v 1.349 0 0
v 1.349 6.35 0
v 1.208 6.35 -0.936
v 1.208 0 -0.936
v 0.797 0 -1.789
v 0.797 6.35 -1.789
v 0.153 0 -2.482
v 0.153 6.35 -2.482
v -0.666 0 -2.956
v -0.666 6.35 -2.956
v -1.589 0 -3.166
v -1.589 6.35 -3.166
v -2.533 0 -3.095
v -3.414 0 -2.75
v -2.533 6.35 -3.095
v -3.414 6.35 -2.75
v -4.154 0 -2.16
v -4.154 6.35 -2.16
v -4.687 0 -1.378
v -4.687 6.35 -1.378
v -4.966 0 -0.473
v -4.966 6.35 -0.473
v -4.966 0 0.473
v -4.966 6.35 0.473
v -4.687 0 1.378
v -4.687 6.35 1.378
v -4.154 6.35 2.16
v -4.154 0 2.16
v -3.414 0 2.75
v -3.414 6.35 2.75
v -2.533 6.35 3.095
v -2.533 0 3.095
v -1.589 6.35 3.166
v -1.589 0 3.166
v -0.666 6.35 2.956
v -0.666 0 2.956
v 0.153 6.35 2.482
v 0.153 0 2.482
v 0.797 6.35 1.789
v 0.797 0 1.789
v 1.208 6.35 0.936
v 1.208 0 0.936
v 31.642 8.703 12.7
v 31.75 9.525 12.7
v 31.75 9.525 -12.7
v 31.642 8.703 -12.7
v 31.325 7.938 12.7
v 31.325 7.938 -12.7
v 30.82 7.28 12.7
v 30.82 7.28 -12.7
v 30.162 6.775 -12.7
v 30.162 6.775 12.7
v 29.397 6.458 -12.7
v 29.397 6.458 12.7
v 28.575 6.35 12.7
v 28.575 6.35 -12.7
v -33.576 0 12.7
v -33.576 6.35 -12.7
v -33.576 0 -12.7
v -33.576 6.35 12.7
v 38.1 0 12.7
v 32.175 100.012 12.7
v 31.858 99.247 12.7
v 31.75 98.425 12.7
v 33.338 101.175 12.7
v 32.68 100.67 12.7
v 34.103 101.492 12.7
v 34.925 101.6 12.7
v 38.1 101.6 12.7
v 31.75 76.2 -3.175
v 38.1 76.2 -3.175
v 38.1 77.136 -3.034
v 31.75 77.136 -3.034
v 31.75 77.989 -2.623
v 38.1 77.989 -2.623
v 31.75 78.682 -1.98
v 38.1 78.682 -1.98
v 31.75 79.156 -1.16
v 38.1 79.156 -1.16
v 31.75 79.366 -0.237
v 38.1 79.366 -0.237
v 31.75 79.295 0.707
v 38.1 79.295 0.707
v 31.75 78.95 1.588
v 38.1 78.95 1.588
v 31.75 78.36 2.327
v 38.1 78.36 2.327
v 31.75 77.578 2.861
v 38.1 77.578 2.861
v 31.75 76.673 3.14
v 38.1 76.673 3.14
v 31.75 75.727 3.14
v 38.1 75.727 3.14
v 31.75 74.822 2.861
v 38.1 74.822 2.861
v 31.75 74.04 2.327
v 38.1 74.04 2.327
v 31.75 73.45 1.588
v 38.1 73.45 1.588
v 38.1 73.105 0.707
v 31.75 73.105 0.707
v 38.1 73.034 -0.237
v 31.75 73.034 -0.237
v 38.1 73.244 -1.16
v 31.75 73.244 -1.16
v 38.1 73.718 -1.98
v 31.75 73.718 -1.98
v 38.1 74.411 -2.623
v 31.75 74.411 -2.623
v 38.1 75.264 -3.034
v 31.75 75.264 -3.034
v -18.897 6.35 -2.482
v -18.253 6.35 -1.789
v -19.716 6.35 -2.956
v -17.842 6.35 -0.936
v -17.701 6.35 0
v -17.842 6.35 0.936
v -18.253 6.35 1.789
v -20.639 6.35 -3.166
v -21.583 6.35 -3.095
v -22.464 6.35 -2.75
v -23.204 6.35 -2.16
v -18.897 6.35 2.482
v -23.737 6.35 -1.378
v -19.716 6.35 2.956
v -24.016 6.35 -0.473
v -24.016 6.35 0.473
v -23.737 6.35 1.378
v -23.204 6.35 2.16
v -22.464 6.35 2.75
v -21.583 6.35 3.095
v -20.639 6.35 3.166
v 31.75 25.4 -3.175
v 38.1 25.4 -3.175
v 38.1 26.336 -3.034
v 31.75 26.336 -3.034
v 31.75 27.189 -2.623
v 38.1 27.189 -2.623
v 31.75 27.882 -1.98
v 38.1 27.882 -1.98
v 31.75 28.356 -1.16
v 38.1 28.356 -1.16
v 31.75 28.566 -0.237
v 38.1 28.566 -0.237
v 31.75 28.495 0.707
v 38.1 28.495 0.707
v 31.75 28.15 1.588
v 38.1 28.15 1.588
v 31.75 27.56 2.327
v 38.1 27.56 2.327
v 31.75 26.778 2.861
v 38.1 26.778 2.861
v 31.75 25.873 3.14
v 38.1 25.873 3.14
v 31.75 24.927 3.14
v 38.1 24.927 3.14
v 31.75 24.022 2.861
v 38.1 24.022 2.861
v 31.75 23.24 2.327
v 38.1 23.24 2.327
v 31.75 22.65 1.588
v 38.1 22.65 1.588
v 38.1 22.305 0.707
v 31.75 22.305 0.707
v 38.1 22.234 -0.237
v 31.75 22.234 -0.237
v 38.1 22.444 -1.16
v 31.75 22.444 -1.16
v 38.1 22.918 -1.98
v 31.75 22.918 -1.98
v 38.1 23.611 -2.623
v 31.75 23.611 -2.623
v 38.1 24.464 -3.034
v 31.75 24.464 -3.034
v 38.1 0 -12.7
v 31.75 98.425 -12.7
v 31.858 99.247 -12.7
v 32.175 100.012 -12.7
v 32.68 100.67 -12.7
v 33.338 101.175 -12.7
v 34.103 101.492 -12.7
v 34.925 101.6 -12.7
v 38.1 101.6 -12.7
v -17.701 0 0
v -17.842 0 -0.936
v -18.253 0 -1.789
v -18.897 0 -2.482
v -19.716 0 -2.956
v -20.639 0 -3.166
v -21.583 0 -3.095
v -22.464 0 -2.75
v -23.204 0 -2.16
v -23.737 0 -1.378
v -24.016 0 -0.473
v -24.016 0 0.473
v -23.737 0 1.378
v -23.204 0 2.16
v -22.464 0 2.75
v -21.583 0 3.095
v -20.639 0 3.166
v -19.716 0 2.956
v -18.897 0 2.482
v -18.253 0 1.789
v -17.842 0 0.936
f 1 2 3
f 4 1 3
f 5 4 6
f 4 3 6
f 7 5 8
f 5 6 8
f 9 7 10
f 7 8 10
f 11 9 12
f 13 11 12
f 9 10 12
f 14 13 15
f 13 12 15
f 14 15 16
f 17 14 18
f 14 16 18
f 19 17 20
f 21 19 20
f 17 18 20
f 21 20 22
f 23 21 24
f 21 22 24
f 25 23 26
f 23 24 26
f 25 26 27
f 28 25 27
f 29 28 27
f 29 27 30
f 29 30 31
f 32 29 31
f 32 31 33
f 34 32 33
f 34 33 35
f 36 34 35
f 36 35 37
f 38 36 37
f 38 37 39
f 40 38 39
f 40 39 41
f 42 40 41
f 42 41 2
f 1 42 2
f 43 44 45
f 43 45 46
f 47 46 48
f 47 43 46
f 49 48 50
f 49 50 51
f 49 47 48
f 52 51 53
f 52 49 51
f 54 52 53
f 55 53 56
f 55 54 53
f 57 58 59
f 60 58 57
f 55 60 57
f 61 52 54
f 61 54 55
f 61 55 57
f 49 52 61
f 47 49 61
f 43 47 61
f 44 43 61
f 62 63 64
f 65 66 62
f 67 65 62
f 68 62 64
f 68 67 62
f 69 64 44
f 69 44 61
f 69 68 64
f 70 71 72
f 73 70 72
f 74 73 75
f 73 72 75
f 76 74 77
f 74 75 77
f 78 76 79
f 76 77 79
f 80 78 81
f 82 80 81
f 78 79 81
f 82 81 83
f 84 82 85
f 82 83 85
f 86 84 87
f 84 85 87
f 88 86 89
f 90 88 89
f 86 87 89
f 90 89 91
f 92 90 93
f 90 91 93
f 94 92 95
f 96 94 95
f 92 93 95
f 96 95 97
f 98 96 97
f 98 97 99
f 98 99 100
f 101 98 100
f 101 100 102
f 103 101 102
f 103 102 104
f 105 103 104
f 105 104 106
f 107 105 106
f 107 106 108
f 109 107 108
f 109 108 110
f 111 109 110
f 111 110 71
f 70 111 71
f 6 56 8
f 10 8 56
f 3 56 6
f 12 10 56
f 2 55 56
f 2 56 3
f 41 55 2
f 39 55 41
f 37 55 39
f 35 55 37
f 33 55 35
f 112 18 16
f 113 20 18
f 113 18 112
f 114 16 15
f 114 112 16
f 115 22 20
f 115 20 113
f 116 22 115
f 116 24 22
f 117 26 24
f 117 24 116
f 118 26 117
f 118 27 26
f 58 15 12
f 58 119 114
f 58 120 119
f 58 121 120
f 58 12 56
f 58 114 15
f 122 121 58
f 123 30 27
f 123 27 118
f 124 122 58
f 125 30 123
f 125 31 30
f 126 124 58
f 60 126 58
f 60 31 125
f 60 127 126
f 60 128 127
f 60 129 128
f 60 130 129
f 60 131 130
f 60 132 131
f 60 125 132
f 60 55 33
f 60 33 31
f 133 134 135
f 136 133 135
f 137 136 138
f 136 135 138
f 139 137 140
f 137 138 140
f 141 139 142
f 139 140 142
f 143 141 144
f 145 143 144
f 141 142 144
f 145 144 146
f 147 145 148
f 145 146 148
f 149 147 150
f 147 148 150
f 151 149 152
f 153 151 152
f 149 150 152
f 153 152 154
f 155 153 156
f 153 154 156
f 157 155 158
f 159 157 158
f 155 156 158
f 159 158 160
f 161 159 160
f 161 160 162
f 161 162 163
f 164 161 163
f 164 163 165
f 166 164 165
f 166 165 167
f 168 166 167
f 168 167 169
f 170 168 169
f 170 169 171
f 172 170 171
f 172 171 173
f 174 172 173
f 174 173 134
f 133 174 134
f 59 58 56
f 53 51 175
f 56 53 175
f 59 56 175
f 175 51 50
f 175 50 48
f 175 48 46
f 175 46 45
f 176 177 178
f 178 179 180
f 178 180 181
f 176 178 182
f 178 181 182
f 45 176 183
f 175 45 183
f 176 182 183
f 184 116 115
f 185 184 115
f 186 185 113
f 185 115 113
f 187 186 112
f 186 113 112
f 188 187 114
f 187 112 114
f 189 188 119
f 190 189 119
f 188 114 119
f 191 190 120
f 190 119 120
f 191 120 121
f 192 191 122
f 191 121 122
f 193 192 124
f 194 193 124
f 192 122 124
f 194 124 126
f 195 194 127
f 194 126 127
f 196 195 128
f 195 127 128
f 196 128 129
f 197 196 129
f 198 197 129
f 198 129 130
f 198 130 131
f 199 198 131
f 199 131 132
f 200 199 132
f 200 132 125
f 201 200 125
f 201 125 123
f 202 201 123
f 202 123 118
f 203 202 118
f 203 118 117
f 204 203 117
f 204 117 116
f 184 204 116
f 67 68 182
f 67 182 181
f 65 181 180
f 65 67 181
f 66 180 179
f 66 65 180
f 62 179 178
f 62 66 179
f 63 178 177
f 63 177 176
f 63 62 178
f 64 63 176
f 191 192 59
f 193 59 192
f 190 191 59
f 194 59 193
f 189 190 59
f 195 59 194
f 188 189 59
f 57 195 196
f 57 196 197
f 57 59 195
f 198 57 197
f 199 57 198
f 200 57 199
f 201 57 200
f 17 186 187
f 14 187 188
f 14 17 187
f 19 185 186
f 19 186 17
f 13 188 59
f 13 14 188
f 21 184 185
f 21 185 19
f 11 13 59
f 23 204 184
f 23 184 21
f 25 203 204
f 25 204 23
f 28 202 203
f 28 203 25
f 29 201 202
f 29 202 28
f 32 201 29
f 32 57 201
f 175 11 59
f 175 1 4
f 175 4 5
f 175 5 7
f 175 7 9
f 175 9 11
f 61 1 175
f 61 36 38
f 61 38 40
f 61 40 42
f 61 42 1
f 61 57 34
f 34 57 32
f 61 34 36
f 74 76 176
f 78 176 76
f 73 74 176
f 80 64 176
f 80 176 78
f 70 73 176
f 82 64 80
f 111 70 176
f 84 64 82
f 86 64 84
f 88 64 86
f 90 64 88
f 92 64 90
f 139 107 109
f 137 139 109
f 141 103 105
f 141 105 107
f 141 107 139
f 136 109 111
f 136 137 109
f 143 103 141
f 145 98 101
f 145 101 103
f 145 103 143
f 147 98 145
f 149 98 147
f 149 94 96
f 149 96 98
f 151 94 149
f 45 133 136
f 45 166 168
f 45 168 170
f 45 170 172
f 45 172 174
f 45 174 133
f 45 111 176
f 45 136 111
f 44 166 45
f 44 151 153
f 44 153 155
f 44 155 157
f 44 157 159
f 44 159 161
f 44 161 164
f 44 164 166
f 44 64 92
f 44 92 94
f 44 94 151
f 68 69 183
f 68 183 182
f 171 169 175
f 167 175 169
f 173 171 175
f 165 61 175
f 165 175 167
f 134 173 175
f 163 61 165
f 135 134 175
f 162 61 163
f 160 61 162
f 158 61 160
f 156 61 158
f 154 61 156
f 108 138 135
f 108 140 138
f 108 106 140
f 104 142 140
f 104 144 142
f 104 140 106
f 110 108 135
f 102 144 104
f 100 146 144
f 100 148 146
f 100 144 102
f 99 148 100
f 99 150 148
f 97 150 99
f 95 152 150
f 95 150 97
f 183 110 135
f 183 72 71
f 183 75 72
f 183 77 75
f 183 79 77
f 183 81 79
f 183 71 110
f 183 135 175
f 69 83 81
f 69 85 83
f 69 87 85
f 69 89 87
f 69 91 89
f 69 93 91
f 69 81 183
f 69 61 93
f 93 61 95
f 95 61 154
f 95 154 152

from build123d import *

# Parameters (mm, degrees)
BOSS_EXTRUDE1_DEPTH = 12.7
CUT_EXTRUDE1_REACH  = 78.2
SKETCH3_R           = 3.175
SKETCH4_W           = 28.507373457
SKETCH4_H           = 9.150354521
CUT_EXTRUDE2_DEPTH  = 4.52374
SKETCH5_R           = 3.175
CUT_EXTRUDE3_DEPTH  = 7.35


with BuildPart() as part:
    # Sketch2 → Boss-Extrude1 (new body, symmetric)
    with BuildSketch(Plane.XY):
        with BuildLine():
            Line((-38.1, 0), (38.1, 0))
            Line((38.1, 0), (38.1, 101.6))
            Line((38.1, 101.6), (34.925, 101.6))
            ThreePointArc((34.925, 101.6), (32.67993597, 100.67006403), (31.75, 98.425))
            Line((31.75, 98.425), (31.75, 9.525))
            ThreePointArc((31.75, 9.525), (30.82006403, 7.27993597), (28.575, 6.35))
            Line((28.575, 6.35), (-34.925, 6.35))
            ThreePointArc((-34.925, 6.35), (-37.17006403, 5.42006403), (-38.1, 3.175))
            Line((-38.1, 3.175), (-38.1, 0))
        make_face()
    extrude(amount=BOSS_EXTRUDE1_DEPTH, both=True)

    # Sketch3 → Cut-Extrude1 (cut, up to next)
    with BuildSketch(Plane(origin=(38.1, 0, 0), x_dir=(0, 0, -1), z_dir=(1, 0, 0)), mode=Mode.PRIVATE) as cut_extrude1_sk1:
        with Locations((0, 76.2)):
            Circle(SKETCH3_R)
    cut_extrude1_tool1 = extrude(cut_extrude1_sk1.sketch, amount=-CUT_EXTRUDE1_REACH, mode=Mode.PRIVATE) & part.part
    add(cut_extrude1_tool1.solids().sort_by_distance((38.1, 76.2, 0))[0], mode=Mode.SUBTRACT)
    # Sketch3 → Cut-Extrude1 (cut, up to next)
    with BuildSketch(Plane(origin=(38.1, 0, 0), x_dir=(0, 0, -1), z_dir=(1, 0, 0)), mode=Mode.PRIVATE) as cut_extrude1_sk2:
        with Locations((0, 25.4)):
            Circle(SKETCH3_R)
    cut_extrude1_tool2 = extrude(cut_extrude1_sk2.sketch, amount=-CUT_EXTRUDE1_REACH, mode=Mode.PRIVATE) & part.part
    add(cut_extrude1_tool2.solids().sort_by_distance((38.1, 25.4, 0))[0], mode=Mode.SUBTRACT)

    # Sketch4 → Cut-Extrude2 (cut)
    with BuildSketch(Plane.ZY.offset(38.1)):
        with Locations((1.553686728, 4.575177261)):
            Rectangle(SKETCH4_W, SKETCH4_H)
    extrude(amount=-CUT_EXTRUDE2_DEPTH, mode=Mode.SUBTRACT)

    # Sketch5 → Cut-Extrude3 (cut, through all)
    with BuildSketch(Plane(origin=(0, 6.35, 0), x_dir=(1, 0, 0), z_dir=(0, 1, 0))):
        with Locations((-1.82626, 0)):
            Circle(SKETCH5_R)
        with Locations((-20.87626, 0)):
            Circle(SKETCH5_R)
    extrude(amount=-CUT_EXTRUDE3_DEPTH, mode=Mode.SUBTRACT)


solid = part.part
